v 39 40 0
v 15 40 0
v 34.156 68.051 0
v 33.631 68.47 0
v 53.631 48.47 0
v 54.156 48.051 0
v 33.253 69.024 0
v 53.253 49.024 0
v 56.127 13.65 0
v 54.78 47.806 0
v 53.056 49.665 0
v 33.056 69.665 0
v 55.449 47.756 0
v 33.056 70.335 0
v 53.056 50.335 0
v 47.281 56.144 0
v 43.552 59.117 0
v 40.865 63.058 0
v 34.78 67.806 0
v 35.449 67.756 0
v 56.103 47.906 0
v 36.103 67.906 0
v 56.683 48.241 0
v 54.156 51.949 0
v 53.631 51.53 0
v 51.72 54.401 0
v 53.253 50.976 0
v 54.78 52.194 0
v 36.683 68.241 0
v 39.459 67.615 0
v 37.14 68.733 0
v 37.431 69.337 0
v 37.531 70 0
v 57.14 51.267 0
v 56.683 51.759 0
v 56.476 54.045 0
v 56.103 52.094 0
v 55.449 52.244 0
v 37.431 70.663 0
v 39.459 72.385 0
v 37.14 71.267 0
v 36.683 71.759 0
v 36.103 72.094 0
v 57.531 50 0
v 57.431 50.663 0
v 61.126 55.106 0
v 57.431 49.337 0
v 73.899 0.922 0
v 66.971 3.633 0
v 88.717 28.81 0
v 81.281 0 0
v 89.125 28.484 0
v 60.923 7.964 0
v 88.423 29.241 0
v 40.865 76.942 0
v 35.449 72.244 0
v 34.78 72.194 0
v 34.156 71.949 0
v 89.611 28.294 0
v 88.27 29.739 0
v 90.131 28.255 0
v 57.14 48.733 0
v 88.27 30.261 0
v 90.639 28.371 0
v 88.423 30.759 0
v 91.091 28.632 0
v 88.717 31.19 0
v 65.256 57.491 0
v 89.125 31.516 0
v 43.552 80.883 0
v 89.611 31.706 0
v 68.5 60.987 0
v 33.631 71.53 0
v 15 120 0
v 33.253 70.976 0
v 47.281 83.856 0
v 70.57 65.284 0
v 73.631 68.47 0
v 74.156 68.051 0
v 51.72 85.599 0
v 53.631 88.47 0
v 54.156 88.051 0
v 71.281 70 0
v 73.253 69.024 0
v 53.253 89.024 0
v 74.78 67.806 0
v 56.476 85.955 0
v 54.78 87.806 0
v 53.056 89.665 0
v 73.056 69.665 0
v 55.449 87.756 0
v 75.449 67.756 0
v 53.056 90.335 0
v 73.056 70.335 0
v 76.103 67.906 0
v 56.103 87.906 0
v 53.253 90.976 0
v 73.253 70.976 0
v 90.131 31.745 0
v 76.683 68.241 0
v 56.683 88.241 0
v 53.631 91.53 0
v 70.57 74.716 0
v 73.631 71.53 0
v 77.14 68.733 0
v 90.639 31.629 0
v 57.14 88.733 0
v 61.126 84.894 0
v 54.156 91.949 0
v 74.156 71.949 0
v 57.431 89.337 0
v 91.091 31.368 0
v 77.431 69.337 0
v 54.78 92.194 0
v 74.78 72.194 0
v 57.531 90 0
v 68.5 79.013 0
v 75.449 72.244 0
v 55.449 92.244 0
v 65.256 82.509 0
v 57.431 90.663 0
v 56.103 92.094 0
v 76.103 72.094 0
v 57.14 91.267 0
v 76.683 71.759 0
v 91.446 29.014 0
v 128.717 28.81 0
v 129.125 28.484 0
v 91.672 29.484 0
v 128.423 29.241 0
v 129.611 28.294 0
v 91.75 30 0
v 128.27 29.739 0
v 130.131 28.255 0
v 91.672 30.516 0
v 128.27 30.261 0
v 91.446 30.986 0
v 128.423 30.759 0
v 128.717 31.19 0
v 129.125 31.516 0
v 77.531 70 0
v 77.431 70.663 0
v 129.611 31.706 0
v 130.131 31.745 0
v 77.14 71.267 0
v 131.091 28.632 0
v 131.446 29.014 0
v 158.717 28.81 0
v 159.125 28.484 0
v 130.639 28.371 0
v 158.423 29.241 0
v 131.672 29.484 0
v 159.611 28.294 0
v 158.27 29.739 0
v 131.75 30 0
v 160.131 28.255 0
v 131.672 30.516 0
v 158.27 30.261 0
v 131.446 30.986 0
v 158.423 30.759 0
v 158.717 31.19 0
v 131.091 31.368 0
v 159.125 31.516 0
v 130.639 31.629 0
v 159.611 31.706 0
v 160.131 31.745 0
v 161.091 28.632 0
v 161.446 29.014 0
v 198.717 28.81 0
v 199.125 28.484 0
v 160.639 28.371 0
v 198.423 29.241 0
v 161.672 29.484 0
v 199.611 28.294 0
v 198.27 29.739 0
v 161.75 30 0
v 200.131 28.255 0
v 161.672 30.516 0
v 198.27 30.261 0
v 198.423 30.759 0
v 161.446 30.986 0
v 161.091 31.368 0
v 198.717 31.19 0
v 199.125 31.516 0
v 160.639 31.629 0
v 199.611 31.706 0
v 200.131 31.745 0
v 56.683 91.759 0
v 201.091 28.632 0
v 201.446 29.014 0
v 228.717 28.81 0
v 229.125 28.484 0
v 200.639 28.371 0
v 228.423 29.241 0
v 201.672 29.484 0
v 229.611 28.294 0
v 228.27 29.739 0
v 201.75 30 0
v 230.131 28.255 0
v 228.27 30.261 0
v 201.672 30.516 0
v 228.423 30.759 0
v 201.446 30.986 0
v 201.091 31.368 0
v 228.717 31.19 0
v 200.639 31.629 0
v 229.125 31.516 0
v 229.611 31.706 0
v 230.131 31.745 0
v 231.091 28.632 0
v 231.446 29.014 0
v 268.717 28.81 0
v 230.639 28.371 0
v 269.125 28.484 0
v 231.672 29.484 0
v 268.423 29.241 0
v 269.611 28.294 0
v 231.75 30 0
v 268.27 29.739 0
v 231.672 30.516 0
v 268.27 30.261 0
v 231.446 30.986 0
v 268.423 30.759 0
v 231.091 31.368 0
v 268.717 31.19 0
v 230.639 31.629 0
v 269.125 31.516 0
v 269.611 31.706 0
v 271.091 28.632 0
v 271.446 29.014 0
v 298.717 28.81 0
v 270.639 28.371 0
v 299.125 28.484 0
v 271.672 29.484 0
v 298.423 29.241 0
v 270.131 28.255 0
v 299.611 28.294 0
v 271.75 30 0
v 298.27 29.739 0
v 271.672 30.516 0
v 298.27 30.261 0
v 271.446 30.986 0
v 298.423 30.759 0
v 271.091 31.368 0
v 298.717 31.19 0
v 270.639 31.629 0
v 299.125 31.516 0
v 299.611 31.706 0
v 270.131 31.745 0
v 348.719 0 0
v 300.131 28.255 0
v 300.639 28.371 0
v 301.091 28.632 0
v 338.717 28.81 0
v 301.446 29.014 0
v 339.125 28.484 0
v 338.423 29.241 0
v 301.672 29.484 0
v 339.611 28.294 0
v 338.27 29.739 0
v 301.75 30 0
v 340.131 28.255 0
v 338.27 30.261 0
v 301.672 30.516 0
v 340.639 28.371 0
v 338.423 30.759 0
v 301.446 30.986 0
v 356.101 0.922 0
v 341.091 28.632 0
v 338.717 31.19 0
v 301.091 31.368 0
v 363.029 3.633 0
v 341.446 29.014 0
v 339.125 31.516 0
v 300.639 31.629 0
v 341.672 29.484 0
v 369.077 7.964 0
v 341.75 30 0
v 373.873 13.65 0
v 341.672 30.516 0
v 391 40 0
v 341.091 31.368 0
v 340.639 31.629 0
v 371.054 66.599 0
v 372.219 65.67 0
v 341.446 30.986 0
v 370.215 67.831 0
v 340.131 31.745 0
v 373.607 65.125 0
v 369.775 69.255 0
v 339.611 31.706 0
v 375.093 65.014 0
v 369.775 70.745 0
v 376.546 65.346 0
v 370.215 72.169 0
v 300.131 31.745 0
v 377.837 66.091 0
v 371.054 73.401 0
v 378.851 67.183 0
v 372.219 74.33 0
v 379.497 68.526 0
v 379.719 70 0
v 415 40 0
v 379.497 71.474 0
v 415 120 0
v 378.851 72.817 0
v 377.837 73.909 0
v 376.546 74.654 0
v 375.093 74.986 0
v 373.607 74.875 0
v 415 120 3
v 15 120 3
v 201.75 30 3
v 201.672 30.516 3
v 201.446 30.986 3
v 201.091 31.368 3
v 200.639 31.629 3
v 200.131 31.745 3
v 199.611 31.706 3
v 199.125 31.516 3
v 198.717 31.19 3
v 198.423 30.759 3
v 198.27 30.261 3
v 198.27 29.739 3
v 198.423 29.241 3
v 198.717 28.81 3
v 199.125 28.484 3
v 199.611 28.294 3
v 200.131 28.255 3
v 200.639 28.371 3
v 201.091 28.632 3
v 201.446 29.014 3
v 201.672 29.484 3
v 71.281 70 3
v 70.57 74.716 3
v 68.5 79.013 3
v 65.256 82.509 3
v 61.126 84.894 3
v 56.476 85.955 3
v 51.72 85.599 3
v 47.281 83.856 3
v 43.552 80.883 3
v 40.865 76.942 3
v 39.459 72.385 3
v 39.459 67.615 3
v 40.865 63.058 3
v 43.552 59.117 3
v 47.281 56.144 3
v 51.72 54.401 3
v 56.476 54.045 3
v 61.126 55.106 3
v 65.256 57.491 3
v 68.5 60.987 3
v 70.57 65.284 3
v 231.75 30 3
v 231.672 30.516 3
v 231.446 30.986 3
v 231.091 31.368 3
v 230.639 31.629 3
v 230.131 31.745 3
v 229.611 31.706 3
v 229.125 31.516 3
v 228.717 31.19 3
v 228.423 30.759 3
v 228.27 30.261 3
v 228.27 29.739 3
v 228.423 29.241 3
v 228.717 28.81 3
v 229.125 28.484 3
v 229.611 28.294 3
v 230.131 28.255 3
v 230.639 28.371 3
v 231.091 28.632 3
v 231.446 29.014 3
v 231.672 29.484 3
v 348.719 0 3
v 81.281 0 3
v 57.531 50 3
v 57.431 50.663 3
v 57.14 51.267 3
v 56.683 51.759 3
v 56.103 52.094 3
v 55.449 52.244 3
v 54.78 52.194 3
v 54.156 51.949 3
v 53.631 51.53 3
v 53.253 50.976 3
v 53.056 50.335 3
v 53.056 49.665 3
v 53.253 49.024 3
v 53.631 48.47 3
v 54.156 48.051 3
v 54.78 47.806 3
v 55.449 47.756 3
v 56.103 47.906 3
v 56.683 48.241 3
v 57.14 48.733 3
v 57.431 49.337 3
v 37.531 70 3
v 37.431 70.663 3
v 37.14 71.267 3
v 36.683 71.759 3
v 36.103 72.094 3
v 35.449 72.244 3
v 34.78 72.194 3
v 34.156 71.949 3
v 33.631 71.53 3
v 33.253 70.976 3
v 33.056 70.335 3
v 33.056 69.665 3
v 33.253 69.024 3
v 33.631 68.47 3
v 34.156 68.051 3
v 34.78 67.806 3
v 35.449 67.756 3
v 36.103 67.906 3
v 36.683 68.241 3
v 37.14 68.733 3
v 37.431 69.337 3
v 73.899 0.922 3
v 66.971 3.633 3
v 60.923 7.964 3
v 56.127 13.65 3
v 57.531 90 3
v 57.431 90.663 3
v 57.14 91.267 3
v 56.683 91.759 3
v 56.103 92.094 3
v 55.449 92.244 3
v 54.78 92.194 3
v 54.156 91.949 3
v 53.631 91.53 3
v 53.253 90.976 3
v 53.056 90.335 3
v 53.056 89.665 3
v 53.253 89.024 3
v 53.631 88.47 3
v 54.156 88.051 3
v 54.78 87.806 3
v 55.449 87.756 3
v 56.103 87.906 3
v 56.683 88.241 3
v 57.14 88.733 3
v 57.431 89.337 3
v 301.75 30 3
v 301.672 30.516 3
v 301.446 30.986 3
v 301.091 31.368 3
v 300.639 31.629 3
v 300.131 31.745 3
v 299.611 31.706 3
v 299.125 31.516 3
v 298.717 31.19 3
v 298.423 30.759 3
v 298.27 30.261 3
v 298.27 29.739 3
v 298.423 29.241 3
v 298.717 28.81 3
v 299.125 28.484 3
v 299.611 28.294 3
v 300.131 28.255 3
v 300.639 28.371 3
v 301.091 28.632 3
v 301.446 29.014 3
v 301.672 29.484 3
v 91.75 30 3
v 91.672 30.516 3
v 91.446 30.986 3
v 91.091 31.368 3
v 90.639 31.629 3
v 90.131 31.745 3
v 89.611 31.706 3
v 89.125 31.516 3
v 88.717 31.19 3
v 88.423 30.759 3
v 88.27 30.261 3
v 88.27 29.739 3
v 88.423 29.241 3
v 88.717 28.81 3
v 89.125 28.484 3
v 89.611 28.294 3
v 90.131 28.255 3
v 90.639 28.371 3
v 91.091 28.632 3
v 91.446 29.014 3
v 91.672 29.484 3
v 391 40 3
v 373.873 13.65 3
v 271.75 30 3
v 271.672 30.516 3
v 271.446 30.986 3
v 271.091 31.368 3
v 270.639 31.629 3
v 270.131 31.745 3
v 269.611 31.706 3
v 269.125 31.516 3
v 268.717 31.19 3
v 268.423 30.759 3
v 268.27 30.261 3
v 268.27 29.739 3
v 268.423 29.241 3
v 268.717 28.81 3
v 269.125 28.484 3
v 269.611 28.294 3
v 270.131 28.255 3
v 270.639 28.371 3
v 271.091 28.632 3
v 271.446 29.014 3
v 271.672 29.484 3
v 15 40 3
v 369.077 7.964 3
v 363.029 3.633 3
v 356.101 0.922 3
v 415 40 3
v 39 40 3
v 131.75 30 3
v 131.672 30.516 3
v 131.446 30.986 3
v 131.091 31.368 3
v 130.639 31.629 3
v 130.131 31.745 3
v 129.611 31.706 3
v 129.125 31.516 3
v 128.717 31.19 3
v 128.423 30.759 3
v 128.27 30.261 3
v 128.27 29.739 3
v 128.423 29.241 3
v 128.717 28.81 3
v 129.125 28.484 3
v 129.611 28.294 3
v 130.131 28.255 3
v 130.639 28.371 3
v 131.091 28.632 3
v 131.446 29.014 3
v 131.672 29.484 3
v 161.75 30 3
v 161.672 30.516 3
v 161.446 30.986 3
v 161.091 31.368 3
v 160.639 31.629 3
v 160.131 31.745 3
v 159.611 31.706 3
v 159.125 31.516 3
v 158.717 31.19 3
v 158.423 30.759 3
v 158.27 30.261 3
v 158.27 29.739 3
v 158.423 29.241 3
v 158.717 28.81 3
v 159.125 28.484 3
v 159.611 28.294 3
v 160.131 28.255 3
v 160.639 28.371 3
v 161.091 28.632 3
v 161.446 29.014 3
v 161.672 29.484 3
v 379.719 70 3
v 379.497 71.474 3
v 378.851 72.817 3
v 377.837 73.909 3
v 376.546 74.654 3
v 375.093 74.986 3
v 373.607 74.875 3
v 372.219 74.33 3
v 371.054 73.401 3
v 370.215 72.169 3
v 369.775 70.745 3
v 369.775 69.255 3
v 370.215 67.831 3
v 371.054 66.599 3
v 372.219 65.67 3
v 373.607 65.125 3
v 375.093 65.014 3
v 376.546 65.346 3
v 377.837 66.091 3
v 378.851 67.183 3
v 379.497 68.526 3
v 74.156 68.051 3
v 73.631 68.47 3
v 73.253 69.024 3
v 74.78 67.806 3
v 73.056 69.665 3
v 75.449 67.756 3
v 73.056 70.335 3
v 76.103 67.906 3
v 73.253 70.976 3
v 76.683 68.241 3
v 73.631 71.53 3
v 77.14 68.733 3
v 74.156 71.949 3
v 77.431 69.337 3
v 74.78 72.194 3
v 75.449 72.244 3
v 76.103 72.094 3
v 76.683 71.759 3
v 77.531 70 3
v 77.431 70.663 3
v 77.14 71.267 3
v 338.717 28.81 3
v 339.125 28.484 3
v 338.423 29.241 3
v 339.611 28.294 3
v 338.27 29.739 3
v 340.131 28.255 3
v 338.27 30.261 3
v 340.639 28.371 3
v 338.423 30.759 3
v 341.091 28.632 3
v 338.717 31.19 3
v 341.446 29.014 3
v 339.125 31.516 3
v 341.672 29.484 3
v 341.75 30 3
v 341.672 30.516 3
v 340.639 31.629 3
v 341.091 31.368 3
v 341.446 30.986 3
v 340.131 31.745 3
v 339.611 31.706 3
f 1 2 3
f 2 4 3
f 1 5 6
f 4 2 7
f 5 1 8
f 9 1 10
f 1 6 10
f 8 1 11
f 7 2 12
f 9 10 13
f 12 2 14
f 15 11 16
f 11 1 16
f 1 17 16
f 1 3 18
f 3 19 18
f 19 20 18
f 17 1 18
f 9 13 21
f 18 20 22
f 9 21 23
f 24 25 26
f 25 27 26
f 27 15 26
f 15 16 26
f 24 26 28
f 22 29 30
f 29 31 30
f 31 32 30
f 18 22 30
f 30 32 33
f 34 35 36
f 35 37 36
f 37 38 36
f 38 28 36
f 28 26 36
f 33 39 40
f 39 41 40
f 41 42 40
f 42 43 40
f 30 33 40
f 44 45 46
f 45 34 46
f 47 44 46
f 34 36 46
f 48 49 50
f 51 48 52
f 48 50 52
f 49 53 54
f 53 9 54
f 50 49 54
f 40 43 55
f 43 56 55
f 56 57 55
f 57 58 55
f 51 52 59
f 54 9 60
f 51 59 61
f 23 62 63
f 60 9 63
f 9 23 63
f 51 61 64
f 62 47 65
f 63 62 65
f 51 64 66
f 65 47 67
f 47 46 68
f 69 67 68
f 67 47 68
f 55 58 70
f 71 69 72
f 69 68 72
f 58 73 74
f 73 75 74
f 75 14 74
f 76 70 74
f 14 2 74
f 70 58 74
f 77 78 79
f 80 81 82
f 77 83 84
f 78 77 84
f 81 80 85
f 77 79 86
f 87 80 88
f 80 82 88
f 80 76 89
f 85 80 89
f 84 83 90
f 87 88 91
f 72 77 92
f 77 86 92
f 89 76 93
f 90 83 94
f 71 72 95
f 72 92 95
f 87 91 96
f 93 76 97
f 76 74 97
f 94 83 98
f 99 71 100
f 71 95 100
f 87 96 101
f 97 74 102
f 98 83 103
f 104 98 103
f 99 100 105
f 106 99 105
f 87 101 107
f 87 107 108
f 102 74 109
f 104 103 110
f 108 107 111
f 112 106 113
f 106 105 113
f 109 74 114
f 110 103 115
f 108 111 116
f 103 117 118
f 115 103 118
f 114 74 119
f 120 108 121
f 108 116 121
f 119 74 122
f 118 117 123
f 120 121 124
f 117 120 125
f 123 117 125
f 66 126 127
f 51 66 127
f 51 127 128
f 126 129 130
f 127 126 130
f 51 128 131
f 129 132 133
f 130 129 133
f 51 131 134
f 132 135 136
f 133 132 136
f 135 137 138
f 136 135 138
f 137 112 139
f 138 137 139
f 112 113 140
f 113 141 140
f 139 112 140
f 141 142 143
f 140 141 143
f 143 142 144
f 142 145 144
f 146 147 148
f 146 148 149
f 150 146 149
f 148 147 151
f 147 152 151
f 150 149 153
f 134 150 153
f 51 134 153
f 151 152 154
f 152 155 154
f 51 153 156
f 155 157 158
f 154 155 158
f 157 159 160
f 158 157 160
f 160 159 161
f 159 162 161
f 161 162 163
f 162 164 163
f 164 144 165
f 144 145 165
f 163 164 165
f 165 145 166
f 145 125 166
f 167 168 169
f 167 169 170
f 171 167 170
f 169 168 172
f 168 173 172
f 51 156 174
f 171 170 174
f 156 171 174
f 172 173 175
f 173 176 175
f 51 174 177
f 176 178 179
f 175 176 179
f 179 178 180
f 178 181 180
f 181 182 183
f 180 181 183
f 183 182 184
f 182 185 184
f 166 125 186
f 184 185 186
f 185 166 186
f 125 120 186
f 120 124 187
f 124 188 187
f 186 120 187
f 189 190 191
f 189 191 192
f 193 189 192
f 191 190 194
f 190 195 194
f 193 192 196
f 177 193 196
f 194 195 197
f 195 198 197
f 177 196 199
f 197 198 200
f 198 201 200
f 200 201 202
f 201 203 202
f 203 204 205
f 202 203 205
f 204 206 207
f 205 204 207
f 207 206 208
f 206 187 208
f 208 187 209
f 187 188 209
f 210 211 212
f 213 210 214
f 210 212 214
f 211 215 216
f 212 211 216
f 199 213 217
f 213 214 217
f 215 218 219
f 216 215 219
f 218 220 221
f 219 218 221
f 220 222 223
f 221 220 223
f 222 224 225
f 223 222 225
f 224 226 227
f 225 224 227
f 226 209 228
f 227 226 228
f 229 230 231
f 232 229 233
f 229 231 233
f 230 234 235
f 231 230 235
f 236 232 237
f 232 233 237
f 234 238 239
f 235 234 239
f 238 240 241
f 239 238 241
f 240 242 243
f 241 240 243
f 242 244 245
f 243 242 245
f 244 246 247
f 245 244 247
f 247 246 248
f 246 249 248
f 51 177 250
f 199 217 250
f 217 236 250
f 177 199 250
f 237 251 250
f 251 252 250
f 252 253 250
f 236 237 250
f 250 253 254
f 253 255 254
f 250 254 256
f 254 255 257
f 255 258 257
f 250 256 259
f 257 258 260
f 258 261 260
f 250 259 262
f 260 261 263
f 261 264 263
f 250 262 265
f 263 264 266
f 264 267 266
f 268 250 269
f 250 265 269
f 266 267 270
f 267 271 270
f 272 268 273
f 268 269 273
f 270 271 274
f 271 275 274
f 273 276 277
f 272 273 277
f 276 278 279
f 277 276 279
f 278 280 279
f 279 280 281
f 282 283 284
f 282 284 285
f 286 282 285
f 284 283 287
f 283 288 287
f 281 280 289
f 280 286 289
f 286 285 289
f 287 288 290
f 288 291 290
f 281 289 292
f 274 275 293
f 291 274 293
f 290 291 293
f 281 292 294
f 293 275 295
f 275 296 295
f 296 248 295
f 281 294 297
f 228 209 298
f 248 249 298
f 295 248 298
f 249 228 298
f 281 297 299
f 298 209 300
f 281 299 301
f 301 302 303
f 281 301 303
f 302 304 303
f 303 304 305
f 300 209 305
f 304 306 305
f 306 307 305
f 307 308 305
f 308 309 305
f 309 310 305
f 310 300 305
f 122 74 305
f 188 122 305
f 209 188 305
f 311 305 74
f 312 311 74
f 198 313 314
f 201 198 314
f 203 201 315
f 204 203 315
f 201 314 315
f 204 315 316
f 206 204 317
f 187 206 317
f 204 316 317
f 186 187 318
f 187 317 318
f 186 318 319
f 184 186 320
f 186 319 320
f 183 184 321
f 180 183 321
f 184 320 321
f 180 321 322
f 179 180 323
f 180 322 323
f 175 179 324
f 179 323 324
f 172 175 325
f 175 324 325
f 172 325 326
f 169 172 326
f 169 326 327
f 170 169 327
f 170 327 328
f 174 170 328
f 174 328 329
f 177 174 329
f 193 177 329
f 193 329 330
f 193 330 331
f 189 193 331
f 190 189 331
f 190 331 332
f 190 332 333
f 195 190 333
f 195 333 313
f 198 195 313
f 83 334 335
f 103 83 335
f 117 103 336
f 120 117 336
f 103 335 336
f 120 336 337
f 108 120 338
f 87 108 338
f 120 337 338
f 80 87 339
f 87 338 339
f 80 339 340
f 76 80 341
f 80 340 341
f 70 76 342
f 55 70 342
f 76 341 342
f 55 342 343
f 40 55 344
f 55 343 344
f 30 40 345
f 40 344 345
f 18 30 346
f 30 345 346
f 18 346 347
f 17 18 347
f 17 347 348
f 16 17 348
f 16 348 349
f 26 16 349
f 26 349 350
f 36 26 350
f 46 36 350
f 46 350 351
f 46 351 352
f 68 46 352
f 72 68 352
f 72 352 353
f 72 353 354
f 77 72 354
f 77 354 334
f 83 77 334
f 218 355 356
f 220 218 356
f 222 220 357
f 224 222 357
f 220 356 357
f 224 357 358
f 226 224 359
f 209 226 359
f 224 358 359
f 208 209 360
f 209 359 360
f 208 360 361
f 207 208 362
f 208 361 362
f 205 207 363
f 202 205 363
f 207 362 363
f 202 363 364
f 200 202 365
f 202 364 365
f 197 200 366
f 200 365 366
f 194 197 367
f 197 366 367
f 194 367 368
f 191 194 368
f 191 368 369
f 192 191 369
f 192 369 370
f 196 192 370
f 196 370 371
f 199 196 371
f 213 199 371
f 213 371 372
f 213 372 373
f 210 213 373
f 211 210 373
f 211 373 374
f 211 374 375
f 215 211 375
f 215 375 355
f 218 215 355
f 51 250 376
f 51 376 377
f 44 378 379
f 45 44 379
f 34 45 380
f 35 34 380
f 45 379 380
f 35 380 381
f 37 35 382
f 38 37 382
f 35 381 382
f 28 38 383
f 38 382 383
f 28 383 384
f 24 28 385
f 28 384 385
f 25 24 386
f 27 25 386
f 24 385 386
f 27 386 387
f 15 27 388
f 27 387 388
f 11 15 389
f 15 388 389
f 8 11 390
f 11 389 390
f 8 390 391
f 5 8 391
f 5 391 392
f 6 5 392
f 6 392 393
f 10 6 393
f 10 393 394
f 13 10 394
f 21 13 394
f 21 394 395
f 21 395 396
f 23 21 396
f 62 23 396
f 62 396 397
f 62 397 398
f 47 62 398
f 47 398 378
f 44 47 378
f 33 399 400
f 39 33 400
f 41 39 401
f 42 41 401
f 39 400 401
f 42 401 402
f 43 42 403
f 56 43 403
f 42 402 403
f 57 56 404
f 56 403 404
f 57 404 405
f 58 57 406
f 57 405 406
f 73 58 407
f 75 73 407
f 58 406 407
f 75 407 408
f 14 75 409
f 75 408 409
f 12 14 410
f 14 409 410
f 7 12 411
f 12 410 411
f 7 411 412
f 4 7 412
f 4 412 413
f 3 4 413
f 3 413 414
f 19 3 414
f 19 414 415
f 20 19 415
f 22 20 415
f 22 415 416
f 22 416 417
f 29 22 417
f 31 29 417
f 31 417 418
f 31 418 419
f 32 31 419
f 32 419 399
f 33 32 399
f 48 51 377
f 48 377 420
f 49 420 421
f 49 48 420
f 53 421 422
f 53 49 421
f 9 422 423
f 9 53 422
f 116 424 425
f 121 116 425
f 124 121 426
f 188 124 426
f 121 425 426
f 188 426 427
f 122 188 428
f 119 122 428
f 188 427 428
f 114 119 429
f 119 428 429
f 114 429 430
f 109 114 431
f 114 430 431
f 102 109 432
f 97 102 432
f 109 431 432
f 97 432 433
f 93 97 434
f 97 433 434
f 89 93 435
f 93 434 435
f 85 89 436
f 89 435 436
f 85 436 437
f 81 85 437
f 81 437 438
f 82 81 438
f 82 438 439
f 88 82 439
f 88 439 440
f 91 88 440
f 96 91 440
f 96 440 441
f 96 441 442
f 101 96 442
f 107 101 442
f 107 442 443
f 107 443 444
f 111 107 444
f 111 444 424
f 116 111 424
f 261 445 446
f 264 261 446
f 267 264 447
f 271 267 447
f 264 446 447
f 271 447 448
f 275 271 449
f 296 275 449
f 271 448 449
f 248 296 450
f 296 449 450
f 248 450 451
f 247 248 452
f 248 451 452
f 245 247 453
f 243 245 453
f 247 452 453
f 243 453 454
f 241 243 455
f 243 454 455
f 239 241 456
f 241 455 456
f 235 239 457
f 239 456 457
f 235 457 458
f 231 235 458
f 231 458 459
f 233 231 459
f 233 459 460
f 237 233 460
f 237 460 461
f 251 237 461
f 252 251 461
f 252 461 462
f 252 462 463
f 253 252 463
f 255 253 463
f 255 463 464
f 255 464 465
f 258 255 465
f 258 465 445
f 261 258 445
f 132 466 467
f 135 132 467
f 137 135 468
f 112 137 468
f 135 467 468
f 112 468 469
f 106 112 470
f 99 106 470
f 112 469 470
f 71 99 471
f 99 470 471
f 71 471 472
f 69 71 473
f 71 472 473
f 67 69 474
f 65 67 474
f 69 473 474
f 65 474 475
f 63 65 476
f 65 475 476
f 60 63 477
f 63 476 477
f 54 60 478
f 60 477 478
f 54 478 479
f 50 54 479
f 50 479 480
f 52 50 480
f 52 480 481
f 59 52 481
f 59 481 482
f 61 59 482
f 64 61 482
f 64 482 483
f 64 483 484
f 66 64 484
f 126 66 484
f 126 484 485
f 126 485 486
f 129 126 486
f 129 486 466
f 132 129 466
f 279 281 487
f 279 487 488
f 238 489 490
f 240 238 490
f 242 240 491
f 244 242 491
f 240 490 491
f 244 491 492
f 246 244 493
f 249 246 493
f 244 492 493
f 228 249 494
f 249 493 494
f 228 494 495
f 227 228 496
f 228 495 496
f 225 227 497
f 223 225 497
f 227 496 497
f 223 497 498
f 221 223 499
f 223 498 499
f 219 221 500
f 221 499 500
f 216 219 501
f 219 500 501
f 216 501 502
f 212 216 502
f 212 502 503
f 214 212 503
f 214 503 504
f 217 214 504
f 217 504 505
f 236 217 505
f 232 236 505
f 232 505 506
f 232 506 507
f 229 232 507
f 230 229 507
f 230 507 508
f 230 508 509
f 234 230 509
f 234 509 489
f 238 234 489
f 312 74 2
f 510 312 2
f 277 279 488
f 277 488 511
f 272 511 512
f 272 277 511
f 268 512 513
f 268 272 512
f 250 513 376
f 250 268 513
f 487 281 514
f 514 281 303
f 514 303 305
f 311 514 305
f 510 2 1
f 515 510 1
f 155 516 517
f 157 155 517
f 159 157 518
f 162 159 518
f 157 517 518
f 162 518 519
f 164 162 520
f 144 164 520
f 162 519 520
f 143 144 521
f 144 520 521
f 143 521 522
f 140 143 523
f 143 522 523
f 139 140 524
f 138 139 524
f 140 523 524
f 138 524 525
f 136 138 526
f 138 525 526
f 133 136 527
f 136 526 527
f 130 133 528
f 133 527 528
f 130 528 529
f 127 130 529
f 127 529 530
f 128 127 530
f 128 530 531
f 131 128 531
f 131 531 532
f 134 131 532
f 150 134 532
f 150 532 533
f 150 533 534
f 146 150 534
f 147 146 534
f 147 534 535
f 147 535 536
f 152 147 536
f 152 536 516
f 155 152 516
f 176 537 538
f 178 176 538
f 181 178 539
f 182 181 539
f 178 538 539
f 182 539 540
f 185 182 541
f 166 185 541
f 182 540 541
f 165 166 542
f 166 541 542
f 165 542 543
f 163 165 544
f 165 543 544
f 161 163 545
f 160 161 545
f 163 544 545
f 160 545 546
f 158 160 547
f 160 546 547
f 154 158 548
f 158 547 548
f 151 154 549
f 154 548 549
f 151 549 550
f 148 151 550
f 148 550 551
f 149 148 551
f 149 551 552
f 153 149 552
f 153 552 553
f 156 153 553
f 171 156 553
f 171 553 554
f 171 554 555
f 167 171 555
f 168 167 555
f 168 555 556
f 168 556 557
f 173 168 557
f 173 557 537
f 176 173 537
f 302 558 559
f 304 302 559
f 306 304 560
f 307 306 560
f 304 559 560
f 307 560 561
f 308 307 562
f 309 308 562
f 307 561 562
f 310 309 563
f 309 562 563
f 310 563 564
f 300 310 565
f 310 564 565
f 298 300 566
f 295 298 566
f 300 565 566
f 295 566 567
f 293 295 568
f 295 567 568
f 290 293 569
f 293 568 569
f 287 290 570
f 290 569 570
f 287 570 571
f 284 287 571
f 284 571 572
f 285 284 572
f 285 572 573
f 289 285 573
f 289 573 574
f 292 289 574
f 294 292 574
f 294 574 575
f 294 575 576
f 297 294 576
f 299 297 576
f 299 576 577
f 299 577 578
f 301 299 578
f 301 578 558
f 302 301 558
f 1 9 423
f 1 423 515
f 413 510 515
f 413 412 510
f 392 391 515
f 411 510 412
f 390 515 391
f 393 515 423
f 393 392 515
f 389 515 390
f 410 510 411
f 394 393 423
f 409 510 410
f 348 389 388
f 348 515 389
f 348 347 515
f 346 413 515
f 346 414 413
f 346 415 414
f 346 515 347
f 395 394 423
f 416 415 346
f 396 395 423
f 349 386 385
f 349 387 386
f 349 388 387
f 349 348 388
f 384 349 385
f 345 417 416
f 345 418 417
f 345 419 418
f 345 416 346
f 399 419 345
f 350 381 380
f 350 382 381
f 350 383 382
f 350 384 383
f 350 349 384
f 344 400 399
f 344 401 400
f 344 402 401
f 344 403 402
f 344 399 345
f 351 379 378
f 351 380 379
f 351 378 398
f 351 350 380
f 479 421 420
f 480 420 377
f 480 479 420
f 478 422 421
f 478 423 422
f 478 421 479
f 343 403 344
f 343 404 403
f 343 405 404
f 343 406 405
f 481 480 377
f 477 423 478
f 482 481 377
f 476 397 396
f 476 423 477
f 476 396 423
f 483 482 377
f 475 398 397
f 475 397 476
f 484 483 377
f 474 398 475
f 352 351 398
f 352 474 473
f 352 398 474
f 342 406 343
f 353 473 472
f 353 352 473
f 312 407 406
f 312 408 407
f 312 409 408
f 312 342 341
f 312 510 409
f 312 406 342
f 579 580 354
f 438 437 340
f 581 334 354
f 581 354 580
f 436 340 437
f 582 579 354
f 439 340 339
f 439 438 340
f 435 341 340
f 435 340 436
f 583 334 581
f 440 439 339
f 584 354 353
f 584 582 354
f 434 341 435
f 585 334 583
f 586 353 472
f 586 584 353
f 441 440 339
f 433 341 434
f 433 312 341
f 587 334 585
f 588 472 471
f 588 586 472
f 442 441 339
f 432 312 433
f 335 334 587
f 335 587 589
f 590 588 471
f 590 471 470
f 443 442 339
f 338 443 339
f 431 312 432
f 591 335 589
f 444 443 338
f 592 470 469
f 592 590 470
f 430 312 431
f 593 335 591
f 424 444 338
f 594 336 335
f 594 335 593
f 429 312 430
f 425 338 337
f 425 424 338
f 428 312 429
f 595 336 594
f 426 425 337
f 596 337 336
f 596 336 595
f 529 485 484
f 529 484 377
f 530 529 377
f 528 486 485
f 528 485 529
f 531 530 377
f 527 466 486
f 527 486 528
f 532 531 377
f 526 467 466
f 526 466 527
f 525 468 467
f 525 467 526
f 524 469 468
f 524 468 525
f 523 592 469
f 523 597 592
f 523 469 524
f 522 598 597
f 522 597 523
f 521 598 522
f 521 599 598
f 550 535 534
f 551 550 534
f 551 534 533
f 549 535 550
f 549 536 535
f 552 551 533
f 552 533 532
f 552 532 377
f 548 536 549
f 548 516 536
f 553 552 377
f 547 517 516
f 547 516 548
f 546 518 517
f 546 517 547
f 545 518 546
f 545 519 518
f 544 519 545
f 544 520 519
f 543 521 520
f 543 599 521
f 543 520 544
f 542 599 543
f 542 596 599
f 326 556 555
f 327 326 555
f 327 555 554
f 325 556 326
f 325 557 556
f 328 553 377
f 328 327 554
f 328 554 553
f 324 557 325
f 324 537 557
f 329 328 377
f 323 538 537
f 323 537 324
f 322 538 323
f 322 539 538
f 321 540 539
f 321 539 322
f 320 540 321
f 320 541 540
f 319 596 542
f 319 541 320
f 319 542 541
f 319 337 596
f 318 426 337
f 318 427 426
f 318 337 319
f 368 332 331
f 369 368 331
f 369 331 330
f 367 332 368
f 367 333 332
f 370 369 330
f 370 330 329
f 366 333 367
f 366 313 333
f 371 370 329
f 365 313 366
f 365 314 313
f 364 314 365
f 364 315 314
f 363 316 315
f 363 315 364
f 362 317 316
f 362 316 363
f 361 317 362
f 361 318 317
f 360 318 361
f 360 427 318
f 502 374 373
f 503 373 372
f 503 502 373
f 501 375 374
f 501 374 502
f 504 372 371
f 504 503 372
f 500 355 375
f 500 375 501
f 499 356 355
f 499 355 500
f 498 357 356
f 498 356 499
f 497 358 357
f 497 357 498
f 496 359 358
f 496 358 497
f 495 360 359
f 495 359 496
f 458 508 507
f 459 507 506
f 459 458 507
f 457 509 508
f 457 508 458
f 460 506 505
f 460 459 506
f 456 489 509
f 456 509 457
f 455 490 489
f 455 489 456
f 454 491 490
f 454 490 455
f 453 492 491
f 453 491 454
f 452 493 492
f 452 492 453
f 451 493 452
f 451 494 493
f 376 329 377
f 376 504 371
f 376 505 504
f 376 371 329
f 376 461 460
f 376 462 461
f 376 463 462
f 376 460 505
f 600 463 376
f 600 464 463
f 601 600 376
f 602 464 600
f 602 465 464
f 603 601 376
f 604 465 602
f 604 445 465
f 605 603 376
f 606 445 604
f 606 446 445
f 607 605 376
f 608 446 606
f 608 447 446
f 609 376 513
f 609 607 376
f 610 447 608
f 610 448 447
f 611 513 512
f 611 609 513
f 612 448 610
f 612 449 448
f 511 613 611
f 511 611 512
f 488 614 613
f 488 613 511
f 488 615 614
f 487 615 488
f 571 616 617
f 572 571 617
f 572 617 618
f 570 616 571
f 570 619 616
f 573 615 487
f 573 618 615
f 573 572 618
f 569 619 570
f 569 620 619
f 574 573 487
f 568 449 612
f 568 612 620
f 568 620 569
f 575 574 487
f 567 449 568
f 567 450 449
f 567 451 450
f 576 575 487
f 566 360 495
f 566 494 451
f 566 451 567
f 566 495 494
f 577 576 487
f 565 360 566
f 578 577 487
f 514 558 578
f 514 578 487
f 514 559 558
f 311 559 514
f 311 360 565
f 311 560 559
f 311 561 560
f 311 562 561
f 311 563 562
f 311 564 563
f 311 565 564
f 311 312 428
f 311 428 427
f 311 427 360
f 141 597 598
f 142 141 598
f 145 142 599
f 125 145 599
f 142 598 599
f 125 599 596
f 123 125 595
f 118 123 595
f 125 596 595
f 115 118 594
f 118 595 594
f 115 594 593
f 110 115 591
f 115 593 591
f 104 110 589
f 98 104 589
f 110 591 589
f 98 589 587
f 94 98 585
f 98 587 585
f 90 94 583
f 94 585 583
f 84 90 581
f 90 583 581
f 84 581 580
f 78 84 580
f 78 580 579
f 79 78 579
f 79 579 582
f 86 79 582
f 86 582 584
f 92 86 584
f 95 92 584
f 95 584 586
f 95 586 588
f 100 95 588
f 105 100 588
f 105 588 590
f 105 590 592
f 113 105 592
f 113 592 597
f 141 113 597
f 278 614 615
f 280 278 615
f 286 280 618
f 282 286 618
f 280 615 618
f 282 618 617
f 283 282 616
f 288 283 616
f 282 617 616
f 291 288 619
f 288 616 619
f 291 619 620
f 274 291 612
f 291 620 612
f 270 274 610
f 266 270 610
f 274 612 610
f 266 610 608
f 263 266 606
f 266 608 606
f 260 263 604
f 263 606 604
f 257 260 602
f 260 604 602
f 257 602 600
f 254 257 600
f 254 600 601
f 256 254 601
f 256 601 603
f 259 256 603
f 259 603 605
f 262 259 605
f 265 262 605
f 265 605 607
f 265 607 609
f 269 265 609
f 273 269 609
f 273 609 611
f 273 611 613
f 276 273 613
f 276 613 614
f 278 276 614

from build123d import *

# Parameters (mm, degrees)
EXTRUDE_1_DEPTH        = 3
SKETCH_3_R             = 16
SKETCH_3_R_2           = 2.25
SKETCH_3_R_3           = 5
CUT_EXTRUDE_3_DEPTH    = 417.901436616
EXTRUDE_START          = -3
EXTRUDE_4_DEPTH        = 3
SKETCH_5_R             = 1.75
CUT_EXTRUDE_5_DEPTH    = 433.011573919
PATTERN_LINEAR_1_COUNT = 4
PATTERN_LINEAR_1_PITCH = 70


with BuildPart() as part:
    # 草圖1 → 伸長1 (new body)
    with BuildSketch(Plane.XY):
        with BuildLine():
            Line((55.280581326, 100), (374.719418674, 100))
            ThreePointArc((374.719418674, 100), (401.086913014, 84.309271198), (399.872727163, 53.650349482))
            Line((399.872727163, 53.650349482), (373.872727163, 13.650349482))
            ThreePointArc((373.872727163, 13.650349482), (363.028689873, 3.63250566), (348.719418674, 0))
            Line((348.719418674, 0), (81.280581326, 0))
            ThreePointArc((81.280581326, 0), (66.971310127, 3.63250566), (56.127272837, 13.650349482))
            Line((56.127272837, 13.650349482), (30.127272837, 53.650349482))
            ThreePointArc((30.127272837, 53.650349482), (28.913086986, 84.309271198), (55.280581326, 100))
        make_face()
    extrude(amount=EXTRUDE_1_DEPTH)

    # 草圖3 → 伸長3 (cut, through all)
    with BuildSketch(Plane.XY.offset(3)):
        with Locations((55.280581326, 70)):
            Circle(SKETCH_3_R)
        with Locations((55.280581326, 90)):
            Circle(SKETCH_3_R_2)
        with Locations((75.280581326, 70)):
            Circle(SKETCH_3_R_2)
        with Locations((55.280581326, 50)):
            Circle(SKETCH_3_R_2)
        with Locations((35.280581326, 70)):
            Circle(SKETCH_3_R_2)
        with Locations((374.719418674, 70)):
            Circle(SKETCH_3_R_3)
    extrude(amount=-CUT_EXTRUDE_3_DEPTH, mode=Mode.SUBTRACT)

    # 草圖4 → 伸長4 (add)
    with BuildSketch(Plane.XY.offset(3).offset(EXTRUDE_START)):
        with BuildLine():
            Line((399.872727163, 53.650349482), (391, 40))
            Line((391, 40), (415, 40))
            Line((415, 40), (415, 120))
            Line((415, 120), (15, 120))
            Line((15, 120), (15, 40))
            Line((15, 40), (39, 40))
            Line((39, 40), (30.127272837, 53.650349482))
            ThreePointArc((30.127272837, 53.650349482), (28.913086986, 84.309271198), (55.280581326, 100))
            Line((55.280581326, 100), (374.719418674, 100))
            ThreePointArc((374.719418674, 100), (401.086913014, 84.309271198), (399.872727163, 53.650349482))
        make_face()
    extrude(amount=EXTRUDE_4_DEPTH)

    # 草圖5 → 伸長5 (cut, through all)
    with BuildSketch(Plane.XY.offset(3)):
        with Locations((130, 30)):
            Circle(SKETCH_5_R)
        with Locations((90, 30)):
            Circle(SKETCH_5_R)
    cut_extrude_5 = extrude(amount=-CUT_EXTRUDE_5_DEPTH, mode=Mode.SUBTRACT)

    # 直線複製排列1: 伸長5 ×4
    with Locations(*[(i * PATTERN_LINEAR_1_PITCH, 0, 0) for i in range(1, PATTERN_LINEAR_1_COUNT)]):
        add(cut_extrude_5, mode=Mode.SUBTRACT)


solid = part.part
